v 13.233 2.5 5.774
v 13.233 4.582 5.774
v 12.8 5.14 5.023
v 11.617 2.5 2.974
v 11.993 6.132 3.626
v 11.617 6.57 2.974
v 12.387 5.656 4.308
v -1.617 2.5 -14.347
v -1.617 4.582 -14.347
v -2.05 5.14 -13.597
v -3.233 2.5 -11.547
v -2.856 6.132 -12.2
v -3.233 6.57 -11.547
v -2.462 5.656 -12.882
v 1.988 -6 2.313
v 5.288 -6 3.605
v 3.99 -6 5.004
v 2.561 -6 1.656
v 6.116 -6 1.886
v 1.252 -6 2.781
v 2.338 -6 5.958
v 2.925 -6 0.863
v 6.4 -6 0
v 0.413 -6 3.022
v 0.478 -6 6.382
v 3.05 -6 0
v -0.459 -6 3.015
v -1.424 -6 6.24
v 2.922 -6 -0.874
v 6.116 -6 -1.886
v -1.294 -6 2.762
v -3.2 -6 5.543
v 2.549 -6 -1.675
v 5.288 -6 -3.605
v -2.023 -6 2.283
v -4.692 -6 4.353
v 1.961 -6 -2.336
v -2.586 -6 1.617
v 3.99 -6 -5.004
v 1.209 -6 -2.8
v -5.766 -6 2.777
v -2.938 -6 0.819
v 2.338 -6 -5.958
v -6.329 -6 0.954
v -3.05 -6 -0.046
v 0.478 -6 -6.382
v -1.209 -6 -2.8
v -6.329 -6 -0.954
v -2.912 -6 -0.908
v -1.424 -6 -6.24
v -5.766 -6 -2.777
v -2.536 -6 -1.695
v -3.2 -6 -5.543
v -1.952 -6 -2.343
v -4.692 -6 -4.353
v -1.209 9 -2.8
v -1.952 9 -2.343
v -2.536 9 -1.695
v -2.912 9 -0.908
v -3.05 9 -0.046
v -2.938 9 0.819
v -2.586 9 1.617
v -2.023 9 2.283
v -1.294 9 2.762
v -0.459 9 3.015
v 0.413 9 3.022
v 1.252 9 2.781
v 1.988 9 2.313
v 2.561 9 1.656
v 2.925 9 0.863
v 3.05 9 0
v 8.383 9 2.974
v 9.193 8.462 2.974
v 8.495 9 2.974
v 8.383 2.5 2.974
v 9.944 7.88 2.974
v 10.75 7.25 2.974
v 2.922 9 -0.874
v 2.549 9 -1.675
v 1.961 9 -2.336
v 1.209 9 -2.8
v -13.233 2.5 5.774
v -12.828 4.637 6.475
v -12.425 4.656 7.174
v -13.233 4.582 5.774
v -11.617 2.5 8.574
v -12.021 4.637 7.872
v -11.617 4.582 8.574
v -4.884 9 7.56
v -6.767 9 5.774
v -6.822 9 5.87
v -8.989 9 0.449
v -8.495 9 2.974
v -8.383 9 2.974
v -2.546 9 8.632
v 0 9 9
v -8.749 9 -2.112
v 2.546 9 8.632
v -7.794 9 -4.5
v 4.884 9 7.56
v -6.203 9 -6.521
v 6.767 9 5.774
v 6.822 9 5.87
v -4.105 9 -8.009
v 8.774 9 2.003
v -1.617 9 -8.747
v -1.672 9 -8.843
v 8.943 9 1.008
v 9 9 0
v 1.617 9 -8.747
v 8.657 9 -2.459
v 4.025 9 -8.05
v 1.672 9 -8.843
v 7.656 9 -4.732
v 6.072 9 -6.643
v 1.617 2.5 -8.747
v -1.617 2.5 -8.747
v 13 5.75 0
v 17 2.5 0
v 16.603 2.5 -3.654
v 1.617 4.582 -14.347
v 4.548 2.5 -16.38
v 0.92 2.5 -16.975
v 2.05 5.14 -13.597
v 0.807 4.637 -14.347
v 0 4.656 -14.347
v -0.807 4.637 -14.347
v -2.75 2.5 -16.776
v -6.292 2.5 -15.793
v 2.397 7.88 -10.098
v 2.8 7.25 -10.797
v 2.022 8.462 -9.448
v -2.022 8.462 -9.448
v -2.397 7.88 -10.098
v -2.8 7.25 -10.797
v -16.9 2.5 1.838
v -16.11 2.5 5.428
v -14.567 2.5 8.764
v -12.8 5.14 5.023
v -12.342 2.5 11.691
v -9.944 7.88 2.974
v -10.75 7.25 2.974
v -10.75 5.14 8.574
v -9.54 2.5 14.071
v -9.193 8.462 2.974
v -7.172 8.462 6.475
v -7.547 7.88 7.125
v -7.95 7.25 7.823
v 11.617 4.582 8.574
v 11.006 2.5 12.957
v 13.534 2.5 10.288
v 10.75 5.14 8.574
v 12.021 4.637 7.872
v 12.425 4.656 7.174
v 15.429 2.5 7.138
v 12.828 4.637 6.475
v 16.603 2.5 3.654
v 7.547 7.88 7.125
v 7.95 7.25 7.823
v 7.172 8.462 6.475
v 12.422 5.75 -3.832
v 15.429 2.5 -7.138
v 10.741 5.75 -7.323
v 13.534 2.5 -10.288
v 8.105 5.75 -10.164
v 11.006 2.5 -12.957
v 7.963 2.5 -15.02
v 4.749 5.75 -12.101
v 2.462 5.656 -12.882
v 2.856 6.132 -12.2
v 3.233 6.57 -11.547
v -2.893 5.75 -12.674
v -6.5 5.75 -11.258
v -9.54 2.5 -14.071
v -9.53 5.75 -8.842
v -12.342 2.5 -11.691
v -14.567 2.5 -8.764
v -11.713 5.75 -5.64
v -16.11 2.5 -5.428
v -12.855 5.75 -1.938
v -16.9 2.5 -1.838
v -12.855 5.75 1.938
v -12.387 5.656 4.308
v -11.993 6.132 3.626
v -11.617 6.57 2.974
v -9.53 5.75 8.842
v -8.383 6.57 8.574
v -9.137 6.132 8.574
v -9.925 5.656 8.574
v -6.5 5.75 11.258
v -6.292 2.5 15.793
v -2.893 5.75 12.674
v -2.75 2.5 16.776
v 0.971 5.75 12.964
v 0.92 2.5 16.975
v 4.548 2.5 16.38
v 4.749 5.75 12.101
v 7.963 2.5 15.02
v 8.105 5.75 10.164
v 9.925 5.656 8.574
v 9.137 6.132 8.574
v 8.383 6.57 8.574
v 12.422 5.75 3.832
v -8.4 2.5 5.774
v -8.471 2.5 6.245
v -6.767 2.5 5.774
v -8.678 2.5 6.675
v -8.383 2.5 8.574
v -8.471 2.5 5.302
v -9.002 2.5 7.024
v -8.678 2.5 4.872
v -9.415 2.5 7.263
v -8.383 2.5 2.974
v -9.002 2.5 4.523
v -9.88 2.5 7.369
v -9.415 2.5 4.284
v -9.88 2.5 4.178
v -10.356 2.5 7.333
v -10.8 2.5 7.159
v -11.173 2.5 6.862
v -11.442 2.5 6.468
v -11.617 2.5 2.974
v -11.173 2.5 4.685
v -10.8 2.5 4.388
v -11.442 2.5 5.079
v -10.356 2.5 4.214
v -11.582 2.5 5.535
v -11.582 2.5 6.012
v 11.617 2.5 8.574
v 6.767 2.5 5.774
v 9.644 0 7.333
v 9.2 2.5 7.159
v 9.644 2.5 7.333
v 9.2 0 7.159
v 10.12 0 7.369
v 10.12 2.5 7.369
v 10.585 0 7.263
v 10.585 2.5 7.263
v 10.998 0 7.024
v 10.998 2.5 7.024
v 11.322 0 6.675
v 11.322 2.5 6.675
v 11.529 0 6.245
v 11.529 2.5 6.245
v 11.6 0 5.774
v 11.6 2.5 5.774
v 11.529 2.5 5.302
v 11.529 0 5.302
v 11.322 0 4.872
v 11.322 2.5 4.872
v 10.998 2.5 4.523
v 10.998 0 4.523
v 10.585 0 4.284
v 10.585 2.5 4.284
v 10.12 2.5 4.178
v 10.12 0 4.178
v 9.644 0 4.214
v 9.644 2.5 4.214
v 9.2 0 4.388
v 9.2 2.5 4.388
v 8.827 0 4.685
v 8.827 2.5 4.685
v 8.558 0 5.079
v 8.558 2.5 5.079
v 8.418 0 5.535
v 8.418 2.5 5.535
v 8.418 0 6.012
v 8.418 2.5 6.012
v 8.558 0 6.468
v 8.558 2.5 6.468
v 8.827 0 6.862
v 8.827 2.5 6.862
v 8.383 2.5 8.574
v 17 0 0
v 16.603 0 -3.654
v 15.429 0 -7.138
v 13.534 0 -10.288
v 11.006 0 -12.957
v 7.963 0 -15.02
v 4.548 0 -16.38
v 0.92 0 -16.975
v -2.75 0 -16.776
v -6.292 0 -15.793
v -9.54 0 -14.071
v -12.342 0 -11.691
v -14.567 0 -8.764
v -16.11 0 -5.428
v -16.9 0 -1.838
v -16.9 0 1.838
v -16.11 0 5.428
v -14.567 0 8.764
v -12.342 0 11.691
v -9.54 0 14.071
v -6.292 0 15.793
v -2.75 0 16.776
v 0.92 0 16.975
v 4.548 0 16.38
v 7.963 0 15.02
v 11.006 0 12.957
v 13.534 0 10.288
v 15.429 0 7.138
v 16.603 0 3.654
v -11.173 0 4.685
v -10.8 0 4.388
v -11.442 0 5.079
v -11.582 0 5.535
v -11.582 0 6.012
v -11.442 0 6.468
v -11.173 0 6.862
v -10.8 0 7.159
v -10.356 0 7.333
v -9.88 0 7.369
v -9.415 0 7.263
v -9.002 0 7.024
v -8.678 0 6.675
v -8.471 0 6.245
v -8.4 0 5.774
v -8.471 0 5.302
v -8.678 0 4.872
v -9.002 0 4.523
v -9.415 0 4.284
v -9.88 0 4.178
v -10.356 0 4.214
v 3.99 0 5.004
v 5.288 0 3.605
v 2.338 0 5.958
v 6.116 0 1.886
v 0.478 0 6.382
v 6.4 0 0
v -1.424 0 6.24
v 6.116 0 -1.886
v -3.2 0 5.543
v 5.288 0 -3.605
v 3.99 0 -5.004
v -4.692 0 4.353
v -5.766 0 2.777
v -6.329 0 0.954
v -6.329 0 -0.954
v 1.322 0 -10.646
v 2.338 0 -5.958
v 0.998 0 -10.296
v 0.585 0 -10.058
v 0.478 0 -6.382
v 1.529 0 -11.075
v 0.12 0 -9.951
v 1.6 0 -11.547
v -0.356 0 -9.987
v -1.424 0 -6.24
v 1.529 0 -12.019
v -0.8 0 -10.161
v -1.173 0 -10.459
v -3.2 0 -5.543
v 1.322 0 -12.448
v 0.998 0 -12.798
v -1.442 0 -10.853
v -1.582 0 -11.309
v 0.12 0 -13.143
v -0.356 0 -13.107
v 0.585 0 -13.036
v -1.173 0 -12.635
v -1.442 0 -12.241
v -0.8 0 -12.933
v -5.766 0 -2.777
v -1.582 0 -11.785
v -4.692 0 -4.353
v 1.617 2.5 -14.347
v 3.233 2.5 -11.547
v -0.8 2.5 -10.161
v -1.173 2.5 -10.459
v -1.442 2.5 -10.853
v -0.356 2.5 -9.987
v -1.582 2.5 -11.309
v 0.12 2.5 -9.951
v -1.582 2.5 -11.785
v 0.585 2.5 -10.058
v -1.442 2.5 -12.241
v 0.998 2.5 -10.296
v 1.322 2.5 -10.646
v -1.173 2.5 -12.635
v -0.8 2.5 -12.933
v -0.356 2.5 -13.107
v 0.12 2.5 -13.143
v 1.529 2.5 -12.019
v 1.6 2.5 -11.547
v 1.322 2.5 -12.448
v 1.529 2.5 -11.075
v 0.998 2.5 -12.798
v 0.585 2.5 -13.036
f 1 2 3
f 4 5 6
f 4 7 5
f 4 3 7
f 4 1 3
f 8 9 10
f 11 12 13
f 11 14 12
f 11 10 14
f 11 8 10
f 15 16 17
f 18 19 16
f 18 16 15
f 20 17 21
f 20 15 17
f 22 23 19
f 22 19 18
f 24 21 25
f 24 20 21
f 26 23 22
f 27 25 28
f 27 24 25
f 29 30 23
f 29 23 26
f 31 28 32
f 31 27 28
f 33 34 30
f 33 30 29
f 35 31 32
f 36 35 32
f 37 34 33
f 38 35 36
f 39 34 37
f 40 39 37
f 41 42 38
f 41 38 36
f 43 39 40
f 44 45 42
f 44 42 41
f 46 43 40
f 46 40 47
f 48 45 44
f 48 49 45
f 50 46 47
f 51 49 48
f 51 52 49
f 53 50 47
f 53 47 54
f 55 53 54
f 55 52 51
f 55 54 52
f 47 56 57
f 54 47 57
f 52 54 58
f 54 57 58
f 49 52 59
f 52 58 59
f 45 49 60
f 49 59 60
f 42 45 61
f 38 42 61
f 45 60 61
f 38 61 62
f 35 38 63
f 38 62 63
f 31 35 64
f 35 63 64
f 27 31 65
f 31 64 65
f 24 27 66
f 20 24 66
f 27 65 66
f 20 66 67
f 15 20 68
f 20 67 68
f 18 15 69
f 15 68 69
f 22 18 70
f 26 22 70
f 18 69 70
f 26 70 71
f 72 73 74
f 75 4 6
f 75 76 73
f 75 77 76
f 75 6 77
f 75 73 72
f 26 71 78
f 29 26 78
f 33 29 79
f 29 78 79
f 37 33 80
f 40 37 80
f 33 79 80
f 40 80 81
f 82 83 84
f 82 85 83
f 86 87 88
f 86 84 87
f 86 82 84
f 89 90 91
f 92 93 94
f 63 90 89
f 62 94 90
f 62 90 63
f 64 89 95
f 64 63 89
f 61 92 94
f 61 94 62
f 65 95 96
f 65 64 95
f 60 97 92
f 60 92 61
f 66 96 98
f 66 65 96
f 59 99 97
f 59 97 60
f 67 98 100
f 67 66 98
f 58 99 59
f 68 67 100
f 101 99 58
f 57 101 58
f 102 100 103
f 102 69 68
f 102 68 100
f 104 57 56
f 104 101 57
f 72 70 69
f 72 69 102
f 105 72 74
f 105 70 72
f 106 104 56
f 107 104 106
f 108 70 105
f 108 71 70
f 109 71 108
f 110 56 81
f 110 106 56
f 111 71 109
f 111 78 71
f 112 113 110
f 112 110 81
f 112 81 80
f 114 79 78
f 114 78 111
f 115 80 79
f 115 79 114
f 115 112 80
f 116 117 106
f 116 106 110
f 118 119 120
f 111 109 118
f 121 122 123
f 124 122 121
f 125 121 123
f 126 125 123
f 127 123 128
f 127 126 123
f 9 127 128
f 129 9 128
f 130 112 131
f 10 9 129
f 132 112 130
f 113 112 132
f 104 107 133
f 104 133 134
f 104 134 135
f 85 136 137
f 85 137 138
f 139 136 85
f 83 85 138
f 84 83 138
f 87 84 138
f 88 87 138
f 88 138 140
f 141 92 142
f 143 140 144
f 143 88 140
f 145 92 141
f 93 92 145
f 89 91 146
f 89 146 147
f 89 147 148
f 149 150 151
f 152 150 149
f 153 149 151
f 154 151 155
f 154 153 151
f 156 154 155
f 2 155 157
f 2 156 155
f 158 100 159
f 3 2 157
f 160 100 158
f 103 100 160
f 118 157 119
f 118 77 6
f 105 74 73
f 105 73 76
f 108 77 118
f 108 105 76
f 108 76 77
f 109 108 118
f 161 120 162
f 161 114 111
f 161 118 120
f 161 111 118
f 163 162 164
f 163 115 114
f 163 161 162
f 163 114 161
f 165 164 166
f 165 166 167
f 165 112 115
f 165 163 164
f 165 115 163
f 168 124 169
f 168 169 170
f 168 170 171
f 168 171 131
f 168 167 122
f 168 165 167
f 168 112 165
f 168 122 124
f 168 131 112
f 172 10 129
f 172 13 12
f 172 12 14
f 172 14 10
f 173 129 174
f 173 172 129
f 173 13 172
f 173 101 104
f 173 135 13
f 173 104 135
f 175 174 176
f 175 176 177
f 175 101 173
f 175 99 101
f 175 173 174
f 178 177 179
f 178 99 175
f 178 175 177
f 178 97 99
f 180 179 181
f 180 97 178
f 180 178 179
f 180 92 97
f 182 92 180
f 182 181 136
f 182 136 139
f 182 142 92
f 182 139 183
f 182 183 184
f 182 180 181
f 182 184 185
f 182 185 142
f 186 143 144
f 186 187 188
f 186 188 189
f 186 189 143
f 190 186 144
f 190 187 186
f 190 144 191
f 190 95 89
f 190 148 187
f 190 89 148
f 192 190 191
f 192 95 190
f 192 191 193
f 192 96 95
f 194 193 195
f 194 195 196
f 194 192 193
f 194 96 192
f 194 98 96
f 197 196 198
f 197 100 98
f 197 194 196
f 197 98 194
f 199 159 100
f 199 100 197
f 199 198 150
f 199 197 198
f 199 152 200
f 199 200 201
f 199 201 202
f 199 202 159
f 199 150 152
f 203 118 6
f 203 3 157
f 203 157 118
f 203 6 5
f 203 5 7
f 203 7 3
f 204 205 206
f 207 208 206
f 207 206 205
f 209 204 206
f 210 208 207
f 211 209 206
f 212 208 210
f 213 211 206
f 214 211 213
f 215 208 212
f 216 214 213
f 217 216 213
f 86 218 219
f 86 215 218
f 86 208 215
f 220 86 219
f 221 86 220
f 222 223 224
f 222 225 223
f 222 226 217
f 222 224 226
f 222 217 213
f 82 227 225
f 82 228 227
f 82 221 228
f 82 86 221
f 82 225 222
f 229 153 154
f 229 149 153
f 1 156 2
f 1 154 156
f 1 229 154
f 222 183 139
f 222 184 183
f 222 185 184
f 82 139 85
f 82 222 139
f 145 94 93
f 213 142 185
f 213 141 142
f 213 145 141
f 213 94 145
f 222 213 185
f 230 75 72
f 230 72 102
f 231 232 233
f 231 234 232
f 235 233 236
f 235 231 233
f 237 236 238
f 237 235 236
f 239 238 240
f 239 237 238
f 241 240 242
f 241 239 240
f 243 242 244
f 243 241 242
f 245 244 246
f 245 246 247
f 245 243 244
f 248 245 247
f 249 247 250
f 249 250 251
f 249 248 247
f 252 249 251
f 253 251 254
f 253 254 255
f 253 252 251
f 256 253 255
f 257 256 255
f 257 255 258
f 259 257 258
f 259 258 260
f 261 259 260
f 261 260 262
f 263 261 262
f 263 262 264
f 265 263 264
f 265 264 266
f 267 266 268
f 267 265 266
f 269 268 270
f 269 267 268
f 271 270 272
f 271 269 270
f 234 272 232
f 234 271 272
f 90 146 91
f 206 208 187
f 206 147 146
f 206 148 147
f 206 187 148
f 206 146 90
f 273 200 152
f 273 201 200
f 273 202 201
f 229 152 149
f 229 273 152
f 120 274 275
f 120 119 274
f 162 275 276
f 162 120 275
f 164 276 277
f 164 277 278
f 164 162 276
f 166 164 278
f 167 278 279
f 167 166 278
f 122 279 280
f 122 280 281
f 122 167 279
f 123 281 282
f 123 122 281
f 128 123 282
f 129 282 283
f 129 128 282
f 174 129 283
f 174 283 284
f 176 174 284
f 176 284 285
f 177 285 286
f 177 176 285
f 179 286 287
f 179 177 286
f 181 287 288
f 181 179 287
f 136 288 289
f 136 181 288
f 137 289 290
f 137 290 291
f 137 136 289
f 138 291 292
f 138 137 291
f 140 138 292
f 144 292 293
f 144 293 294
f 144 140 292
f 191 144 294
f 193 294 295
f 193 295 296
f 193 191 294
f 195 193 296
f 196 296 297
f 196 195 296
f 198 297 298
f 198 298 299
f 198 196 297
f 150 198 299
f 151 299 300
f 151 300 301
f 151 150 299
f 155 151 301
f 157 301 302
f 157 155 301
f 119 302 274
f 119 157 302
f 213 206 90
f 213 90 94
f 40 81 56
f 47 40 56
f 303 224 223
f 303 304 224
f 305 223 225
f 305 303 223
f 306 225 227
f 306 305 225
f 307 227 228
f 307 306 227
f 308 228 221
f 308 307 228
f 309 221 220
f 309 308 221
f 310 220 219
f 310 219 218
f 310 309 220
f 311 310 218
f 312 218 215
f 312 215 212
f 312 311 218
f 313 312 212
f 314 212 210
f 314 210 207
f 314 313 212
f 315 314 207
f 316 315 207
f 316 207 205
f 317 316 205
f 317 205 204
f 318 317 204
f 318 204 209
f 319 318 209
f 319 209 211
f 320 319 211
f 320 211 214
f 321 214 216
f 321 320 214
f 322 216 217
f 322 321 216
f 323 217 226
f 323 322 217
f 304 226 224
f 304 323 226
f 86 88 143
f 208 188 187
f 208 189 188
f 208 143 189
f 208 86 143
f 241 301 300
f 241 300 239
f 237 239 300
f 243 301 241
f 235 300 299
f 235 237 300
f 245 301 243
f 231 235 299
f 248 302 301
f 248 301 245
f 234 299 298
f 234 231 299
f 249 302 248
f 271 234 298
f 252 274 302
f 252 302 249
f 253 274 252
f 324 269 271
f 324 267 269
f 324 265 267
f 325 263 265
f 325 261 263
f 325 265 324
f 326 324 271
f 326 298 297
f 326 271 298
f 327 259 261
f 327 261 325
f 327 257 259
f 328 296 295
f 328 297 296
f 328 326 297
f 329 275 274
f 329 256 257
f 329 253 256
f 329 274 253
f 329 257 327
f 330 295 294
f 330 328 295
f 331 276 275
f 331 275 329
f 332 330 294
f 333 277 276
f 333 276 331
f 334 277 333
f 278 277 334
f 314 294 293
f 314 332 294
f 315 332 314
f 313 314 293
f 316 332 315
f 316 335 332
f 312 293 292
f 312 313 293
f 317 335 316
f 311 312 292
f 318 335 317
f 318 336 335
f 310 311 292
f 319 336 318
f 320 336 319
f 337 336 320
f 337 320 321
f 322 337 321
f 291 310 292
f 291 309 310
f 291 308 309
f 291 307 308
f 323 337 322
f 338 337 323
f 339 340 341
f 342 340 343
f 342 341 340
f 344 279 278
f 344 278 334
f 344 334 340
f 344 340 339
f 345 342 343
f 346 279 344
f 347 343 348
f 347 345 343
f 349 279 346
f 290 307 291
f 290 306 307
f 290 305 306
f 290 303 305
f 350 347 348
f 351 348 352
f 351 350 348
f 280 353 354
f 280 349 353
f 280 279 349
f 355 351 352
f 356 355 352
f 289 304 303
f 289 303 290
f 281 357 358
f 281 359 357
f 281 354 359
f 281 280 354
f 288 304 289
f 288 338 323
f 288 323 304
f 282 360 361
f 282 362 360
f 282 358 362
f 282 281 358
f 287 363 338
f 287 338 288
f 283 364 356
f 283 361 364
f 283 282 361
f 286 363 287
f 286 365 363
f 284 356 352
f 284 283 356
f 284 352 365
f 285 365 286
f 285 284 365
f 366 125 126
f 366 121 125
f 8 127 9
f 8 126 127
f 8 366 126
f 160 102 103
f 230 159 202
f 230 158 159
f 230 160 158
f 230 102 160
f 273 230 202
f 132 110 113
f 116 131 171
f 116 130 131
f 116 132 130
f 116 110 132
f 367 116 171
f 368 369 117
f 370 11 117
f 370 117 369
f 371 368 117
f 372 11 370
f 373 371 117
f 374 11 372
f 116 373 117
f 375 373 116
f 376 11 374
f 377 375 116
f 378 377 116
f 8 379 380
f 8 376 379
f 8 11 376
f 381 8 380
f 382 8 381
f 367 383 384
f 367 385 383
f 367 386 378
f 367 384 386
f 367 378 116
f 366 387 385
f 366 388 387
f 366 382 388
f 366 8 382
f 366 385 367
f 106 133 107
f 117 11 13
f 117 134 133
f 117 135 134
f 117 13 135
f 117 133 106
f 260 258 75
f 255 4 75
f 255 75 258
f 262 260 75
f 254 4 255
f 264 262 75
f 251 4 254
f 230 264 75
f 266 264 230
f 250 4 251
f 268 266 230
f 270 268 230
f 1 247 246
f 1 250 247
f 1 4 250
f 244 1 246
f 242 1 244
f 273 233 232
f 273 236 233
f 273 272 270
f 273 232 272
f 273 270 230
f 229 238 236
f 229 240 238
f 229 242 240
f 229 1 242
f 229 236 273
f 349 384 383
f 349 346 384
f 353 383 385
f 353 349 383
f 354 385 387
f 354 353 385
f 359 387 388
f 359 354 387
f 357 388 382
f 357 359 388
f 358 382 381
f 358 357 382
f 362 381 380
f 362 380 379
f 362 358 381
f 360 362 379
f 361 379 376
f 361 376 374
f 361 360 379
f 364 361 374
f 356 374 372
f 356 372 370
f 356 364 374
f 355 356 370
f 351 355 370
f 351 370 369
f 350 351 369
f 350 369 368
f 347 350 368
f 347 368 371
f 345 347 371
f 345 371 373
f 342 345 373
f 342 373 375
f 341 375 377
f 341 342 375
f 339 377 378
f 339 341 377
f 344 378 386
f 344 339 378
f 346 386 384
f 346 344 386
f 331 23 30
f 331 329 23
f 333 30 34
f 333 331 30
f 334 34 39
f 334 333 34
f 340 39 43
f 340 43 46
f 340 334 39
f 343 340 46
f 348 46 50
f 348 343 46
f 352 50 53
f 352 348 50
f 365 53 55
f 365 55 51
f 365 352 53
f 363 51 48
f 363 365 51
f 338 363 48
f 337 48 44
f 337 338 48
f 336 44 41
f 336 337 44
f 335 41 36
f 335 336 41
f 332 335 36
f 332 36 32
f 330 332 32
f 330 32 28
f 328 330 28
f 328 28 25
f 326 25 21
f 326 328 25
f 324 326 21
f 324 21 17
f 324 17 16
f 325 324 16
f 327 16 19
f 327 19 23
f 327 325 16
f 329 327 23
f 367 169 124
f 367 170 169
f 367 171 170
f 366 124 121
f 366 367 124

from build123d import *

# Parameters (mm, degrees)
ESQUISSE3_W                  = 6.4
ESQUISSE3_H                  = 6
ENL_V_START                  = 2.5
ESQUISSE5_R                  = 1.6
ENL_V_MAT_EXTRU_1_DEPTH      = 7.5
ENL_V_START_2                = -7
ESQUISSE5_2_R                = 1.6
ENL_V_MAT_EXTRU_2_DEPTH      = 17
R_P_TITION_CIRCULAIRE1_COUNT = 3
ENL_V_MAT_EXTRU_3_DEPTH      = 16


with BuildPart() as part:
    # Esquisse3 → R_volution1 (revolve)
    with BuildSketch(Plane.XY):
        Polygon((9, 9), (0, 9), (0, 0), (17, 0), (17, 2.5), align=None)
        with Locations((3.2, -3)):
            Rectangle(ESQUISSE3_W, ESQUISSE3_H)
    revolve(axis=Axis((0, 0, 0), (0, 1, 0)))

    # Esquisse5 → Enl_v. mat.-Extru.1 (cut, through all)
    with BuildSketch(Plane(origin=(0, 0, 0), x_dir=(1, 0, 0), z_dir=(0, 1, 0)).offset(ENL_V_START)):
        Polygon((1.616580754, 8.747005384), (3.233161507, 11.547005384), (1.616580754, 14.347005384), (-1.616580754, 14.347005384), (-3.233161507, 11.547005384), (-1.616580754, 8.747005384), align=None)
        with Locations((0, 11.547005384)):
            Circle(ESQUISSE5_R, mode=Mode.SUBTRACT)
    enl_v_mat_extru_1 = extrude(amount=ENL_V_MAT_EXTRU_1_DEPTH, mode=Mode.SUBTRACT)

    # Esquisse5_2 → Enl_v. mat.-Extru.2 (cut)
    with BuildSketch(Plane(origin=(0, 0, 0), x_dir=(1, 0, 0), z_dir=(0, 1, 0)).offset(ENL_V_START_2)):
        with Locations((0, 11.547005384)):
            Circle(ESQUISSE5_2_R)
    enl_v_mat_extru_2 = extrude(amount=ENL_V_MAT_EXTRU_2_DEPTH, mode=Mode.SUBTRACT)

    # R_p_tition circulaire1: Enl_v. mat.-Extru.1, Enl_v. mat.-Extru.2 ×3 about axis
    r_p_tition_circulaire1_axis = Axis((0, 0, 0), (0, 1, 0))
    for i in range(1, R_P_TITION_CIRCULAIRE1_COUNT):
        add(enl_v_mat_extru_1.rotate(r_p_tition_circulaire1_axis, i * 360 / R_P_TITION_CIRCULAIRE1_COUNT), mode=Mode.SUBTRACT)
        add(enl_v_mat_extru_2.rotate(r_p_tition_circulaire1_axis, i * 360 / R_P_TITION_CIRCULAIRE1_COUNT), mode=Mode.SUBTRACT)

    # Esquisse6 → Enl_v. mat.-Extru.3 (cut, through all)
    with BuildSketch(Plane(origin=(0, 9, 0), x_dir=(1, 0, 0), z_dir=(0, 1, 0))):
        with BuildLine():
            Line((1.209338662, 2.8), (-1.209338662, 2.8))
            ThreePointArc((-1.209338662, 2.8), (-1.675412946, -2.548625406), (3.05, 0))
            ThreePointArc((3.05, 0), (2.548625406, 1.675412946), (1.209338662, 2.8))
        make_face()
    extrude(amount=-ENL_V_MAT_EXTRU_3_DEPTH, mode=Mode.SUBTRACT)


solid = part.part
